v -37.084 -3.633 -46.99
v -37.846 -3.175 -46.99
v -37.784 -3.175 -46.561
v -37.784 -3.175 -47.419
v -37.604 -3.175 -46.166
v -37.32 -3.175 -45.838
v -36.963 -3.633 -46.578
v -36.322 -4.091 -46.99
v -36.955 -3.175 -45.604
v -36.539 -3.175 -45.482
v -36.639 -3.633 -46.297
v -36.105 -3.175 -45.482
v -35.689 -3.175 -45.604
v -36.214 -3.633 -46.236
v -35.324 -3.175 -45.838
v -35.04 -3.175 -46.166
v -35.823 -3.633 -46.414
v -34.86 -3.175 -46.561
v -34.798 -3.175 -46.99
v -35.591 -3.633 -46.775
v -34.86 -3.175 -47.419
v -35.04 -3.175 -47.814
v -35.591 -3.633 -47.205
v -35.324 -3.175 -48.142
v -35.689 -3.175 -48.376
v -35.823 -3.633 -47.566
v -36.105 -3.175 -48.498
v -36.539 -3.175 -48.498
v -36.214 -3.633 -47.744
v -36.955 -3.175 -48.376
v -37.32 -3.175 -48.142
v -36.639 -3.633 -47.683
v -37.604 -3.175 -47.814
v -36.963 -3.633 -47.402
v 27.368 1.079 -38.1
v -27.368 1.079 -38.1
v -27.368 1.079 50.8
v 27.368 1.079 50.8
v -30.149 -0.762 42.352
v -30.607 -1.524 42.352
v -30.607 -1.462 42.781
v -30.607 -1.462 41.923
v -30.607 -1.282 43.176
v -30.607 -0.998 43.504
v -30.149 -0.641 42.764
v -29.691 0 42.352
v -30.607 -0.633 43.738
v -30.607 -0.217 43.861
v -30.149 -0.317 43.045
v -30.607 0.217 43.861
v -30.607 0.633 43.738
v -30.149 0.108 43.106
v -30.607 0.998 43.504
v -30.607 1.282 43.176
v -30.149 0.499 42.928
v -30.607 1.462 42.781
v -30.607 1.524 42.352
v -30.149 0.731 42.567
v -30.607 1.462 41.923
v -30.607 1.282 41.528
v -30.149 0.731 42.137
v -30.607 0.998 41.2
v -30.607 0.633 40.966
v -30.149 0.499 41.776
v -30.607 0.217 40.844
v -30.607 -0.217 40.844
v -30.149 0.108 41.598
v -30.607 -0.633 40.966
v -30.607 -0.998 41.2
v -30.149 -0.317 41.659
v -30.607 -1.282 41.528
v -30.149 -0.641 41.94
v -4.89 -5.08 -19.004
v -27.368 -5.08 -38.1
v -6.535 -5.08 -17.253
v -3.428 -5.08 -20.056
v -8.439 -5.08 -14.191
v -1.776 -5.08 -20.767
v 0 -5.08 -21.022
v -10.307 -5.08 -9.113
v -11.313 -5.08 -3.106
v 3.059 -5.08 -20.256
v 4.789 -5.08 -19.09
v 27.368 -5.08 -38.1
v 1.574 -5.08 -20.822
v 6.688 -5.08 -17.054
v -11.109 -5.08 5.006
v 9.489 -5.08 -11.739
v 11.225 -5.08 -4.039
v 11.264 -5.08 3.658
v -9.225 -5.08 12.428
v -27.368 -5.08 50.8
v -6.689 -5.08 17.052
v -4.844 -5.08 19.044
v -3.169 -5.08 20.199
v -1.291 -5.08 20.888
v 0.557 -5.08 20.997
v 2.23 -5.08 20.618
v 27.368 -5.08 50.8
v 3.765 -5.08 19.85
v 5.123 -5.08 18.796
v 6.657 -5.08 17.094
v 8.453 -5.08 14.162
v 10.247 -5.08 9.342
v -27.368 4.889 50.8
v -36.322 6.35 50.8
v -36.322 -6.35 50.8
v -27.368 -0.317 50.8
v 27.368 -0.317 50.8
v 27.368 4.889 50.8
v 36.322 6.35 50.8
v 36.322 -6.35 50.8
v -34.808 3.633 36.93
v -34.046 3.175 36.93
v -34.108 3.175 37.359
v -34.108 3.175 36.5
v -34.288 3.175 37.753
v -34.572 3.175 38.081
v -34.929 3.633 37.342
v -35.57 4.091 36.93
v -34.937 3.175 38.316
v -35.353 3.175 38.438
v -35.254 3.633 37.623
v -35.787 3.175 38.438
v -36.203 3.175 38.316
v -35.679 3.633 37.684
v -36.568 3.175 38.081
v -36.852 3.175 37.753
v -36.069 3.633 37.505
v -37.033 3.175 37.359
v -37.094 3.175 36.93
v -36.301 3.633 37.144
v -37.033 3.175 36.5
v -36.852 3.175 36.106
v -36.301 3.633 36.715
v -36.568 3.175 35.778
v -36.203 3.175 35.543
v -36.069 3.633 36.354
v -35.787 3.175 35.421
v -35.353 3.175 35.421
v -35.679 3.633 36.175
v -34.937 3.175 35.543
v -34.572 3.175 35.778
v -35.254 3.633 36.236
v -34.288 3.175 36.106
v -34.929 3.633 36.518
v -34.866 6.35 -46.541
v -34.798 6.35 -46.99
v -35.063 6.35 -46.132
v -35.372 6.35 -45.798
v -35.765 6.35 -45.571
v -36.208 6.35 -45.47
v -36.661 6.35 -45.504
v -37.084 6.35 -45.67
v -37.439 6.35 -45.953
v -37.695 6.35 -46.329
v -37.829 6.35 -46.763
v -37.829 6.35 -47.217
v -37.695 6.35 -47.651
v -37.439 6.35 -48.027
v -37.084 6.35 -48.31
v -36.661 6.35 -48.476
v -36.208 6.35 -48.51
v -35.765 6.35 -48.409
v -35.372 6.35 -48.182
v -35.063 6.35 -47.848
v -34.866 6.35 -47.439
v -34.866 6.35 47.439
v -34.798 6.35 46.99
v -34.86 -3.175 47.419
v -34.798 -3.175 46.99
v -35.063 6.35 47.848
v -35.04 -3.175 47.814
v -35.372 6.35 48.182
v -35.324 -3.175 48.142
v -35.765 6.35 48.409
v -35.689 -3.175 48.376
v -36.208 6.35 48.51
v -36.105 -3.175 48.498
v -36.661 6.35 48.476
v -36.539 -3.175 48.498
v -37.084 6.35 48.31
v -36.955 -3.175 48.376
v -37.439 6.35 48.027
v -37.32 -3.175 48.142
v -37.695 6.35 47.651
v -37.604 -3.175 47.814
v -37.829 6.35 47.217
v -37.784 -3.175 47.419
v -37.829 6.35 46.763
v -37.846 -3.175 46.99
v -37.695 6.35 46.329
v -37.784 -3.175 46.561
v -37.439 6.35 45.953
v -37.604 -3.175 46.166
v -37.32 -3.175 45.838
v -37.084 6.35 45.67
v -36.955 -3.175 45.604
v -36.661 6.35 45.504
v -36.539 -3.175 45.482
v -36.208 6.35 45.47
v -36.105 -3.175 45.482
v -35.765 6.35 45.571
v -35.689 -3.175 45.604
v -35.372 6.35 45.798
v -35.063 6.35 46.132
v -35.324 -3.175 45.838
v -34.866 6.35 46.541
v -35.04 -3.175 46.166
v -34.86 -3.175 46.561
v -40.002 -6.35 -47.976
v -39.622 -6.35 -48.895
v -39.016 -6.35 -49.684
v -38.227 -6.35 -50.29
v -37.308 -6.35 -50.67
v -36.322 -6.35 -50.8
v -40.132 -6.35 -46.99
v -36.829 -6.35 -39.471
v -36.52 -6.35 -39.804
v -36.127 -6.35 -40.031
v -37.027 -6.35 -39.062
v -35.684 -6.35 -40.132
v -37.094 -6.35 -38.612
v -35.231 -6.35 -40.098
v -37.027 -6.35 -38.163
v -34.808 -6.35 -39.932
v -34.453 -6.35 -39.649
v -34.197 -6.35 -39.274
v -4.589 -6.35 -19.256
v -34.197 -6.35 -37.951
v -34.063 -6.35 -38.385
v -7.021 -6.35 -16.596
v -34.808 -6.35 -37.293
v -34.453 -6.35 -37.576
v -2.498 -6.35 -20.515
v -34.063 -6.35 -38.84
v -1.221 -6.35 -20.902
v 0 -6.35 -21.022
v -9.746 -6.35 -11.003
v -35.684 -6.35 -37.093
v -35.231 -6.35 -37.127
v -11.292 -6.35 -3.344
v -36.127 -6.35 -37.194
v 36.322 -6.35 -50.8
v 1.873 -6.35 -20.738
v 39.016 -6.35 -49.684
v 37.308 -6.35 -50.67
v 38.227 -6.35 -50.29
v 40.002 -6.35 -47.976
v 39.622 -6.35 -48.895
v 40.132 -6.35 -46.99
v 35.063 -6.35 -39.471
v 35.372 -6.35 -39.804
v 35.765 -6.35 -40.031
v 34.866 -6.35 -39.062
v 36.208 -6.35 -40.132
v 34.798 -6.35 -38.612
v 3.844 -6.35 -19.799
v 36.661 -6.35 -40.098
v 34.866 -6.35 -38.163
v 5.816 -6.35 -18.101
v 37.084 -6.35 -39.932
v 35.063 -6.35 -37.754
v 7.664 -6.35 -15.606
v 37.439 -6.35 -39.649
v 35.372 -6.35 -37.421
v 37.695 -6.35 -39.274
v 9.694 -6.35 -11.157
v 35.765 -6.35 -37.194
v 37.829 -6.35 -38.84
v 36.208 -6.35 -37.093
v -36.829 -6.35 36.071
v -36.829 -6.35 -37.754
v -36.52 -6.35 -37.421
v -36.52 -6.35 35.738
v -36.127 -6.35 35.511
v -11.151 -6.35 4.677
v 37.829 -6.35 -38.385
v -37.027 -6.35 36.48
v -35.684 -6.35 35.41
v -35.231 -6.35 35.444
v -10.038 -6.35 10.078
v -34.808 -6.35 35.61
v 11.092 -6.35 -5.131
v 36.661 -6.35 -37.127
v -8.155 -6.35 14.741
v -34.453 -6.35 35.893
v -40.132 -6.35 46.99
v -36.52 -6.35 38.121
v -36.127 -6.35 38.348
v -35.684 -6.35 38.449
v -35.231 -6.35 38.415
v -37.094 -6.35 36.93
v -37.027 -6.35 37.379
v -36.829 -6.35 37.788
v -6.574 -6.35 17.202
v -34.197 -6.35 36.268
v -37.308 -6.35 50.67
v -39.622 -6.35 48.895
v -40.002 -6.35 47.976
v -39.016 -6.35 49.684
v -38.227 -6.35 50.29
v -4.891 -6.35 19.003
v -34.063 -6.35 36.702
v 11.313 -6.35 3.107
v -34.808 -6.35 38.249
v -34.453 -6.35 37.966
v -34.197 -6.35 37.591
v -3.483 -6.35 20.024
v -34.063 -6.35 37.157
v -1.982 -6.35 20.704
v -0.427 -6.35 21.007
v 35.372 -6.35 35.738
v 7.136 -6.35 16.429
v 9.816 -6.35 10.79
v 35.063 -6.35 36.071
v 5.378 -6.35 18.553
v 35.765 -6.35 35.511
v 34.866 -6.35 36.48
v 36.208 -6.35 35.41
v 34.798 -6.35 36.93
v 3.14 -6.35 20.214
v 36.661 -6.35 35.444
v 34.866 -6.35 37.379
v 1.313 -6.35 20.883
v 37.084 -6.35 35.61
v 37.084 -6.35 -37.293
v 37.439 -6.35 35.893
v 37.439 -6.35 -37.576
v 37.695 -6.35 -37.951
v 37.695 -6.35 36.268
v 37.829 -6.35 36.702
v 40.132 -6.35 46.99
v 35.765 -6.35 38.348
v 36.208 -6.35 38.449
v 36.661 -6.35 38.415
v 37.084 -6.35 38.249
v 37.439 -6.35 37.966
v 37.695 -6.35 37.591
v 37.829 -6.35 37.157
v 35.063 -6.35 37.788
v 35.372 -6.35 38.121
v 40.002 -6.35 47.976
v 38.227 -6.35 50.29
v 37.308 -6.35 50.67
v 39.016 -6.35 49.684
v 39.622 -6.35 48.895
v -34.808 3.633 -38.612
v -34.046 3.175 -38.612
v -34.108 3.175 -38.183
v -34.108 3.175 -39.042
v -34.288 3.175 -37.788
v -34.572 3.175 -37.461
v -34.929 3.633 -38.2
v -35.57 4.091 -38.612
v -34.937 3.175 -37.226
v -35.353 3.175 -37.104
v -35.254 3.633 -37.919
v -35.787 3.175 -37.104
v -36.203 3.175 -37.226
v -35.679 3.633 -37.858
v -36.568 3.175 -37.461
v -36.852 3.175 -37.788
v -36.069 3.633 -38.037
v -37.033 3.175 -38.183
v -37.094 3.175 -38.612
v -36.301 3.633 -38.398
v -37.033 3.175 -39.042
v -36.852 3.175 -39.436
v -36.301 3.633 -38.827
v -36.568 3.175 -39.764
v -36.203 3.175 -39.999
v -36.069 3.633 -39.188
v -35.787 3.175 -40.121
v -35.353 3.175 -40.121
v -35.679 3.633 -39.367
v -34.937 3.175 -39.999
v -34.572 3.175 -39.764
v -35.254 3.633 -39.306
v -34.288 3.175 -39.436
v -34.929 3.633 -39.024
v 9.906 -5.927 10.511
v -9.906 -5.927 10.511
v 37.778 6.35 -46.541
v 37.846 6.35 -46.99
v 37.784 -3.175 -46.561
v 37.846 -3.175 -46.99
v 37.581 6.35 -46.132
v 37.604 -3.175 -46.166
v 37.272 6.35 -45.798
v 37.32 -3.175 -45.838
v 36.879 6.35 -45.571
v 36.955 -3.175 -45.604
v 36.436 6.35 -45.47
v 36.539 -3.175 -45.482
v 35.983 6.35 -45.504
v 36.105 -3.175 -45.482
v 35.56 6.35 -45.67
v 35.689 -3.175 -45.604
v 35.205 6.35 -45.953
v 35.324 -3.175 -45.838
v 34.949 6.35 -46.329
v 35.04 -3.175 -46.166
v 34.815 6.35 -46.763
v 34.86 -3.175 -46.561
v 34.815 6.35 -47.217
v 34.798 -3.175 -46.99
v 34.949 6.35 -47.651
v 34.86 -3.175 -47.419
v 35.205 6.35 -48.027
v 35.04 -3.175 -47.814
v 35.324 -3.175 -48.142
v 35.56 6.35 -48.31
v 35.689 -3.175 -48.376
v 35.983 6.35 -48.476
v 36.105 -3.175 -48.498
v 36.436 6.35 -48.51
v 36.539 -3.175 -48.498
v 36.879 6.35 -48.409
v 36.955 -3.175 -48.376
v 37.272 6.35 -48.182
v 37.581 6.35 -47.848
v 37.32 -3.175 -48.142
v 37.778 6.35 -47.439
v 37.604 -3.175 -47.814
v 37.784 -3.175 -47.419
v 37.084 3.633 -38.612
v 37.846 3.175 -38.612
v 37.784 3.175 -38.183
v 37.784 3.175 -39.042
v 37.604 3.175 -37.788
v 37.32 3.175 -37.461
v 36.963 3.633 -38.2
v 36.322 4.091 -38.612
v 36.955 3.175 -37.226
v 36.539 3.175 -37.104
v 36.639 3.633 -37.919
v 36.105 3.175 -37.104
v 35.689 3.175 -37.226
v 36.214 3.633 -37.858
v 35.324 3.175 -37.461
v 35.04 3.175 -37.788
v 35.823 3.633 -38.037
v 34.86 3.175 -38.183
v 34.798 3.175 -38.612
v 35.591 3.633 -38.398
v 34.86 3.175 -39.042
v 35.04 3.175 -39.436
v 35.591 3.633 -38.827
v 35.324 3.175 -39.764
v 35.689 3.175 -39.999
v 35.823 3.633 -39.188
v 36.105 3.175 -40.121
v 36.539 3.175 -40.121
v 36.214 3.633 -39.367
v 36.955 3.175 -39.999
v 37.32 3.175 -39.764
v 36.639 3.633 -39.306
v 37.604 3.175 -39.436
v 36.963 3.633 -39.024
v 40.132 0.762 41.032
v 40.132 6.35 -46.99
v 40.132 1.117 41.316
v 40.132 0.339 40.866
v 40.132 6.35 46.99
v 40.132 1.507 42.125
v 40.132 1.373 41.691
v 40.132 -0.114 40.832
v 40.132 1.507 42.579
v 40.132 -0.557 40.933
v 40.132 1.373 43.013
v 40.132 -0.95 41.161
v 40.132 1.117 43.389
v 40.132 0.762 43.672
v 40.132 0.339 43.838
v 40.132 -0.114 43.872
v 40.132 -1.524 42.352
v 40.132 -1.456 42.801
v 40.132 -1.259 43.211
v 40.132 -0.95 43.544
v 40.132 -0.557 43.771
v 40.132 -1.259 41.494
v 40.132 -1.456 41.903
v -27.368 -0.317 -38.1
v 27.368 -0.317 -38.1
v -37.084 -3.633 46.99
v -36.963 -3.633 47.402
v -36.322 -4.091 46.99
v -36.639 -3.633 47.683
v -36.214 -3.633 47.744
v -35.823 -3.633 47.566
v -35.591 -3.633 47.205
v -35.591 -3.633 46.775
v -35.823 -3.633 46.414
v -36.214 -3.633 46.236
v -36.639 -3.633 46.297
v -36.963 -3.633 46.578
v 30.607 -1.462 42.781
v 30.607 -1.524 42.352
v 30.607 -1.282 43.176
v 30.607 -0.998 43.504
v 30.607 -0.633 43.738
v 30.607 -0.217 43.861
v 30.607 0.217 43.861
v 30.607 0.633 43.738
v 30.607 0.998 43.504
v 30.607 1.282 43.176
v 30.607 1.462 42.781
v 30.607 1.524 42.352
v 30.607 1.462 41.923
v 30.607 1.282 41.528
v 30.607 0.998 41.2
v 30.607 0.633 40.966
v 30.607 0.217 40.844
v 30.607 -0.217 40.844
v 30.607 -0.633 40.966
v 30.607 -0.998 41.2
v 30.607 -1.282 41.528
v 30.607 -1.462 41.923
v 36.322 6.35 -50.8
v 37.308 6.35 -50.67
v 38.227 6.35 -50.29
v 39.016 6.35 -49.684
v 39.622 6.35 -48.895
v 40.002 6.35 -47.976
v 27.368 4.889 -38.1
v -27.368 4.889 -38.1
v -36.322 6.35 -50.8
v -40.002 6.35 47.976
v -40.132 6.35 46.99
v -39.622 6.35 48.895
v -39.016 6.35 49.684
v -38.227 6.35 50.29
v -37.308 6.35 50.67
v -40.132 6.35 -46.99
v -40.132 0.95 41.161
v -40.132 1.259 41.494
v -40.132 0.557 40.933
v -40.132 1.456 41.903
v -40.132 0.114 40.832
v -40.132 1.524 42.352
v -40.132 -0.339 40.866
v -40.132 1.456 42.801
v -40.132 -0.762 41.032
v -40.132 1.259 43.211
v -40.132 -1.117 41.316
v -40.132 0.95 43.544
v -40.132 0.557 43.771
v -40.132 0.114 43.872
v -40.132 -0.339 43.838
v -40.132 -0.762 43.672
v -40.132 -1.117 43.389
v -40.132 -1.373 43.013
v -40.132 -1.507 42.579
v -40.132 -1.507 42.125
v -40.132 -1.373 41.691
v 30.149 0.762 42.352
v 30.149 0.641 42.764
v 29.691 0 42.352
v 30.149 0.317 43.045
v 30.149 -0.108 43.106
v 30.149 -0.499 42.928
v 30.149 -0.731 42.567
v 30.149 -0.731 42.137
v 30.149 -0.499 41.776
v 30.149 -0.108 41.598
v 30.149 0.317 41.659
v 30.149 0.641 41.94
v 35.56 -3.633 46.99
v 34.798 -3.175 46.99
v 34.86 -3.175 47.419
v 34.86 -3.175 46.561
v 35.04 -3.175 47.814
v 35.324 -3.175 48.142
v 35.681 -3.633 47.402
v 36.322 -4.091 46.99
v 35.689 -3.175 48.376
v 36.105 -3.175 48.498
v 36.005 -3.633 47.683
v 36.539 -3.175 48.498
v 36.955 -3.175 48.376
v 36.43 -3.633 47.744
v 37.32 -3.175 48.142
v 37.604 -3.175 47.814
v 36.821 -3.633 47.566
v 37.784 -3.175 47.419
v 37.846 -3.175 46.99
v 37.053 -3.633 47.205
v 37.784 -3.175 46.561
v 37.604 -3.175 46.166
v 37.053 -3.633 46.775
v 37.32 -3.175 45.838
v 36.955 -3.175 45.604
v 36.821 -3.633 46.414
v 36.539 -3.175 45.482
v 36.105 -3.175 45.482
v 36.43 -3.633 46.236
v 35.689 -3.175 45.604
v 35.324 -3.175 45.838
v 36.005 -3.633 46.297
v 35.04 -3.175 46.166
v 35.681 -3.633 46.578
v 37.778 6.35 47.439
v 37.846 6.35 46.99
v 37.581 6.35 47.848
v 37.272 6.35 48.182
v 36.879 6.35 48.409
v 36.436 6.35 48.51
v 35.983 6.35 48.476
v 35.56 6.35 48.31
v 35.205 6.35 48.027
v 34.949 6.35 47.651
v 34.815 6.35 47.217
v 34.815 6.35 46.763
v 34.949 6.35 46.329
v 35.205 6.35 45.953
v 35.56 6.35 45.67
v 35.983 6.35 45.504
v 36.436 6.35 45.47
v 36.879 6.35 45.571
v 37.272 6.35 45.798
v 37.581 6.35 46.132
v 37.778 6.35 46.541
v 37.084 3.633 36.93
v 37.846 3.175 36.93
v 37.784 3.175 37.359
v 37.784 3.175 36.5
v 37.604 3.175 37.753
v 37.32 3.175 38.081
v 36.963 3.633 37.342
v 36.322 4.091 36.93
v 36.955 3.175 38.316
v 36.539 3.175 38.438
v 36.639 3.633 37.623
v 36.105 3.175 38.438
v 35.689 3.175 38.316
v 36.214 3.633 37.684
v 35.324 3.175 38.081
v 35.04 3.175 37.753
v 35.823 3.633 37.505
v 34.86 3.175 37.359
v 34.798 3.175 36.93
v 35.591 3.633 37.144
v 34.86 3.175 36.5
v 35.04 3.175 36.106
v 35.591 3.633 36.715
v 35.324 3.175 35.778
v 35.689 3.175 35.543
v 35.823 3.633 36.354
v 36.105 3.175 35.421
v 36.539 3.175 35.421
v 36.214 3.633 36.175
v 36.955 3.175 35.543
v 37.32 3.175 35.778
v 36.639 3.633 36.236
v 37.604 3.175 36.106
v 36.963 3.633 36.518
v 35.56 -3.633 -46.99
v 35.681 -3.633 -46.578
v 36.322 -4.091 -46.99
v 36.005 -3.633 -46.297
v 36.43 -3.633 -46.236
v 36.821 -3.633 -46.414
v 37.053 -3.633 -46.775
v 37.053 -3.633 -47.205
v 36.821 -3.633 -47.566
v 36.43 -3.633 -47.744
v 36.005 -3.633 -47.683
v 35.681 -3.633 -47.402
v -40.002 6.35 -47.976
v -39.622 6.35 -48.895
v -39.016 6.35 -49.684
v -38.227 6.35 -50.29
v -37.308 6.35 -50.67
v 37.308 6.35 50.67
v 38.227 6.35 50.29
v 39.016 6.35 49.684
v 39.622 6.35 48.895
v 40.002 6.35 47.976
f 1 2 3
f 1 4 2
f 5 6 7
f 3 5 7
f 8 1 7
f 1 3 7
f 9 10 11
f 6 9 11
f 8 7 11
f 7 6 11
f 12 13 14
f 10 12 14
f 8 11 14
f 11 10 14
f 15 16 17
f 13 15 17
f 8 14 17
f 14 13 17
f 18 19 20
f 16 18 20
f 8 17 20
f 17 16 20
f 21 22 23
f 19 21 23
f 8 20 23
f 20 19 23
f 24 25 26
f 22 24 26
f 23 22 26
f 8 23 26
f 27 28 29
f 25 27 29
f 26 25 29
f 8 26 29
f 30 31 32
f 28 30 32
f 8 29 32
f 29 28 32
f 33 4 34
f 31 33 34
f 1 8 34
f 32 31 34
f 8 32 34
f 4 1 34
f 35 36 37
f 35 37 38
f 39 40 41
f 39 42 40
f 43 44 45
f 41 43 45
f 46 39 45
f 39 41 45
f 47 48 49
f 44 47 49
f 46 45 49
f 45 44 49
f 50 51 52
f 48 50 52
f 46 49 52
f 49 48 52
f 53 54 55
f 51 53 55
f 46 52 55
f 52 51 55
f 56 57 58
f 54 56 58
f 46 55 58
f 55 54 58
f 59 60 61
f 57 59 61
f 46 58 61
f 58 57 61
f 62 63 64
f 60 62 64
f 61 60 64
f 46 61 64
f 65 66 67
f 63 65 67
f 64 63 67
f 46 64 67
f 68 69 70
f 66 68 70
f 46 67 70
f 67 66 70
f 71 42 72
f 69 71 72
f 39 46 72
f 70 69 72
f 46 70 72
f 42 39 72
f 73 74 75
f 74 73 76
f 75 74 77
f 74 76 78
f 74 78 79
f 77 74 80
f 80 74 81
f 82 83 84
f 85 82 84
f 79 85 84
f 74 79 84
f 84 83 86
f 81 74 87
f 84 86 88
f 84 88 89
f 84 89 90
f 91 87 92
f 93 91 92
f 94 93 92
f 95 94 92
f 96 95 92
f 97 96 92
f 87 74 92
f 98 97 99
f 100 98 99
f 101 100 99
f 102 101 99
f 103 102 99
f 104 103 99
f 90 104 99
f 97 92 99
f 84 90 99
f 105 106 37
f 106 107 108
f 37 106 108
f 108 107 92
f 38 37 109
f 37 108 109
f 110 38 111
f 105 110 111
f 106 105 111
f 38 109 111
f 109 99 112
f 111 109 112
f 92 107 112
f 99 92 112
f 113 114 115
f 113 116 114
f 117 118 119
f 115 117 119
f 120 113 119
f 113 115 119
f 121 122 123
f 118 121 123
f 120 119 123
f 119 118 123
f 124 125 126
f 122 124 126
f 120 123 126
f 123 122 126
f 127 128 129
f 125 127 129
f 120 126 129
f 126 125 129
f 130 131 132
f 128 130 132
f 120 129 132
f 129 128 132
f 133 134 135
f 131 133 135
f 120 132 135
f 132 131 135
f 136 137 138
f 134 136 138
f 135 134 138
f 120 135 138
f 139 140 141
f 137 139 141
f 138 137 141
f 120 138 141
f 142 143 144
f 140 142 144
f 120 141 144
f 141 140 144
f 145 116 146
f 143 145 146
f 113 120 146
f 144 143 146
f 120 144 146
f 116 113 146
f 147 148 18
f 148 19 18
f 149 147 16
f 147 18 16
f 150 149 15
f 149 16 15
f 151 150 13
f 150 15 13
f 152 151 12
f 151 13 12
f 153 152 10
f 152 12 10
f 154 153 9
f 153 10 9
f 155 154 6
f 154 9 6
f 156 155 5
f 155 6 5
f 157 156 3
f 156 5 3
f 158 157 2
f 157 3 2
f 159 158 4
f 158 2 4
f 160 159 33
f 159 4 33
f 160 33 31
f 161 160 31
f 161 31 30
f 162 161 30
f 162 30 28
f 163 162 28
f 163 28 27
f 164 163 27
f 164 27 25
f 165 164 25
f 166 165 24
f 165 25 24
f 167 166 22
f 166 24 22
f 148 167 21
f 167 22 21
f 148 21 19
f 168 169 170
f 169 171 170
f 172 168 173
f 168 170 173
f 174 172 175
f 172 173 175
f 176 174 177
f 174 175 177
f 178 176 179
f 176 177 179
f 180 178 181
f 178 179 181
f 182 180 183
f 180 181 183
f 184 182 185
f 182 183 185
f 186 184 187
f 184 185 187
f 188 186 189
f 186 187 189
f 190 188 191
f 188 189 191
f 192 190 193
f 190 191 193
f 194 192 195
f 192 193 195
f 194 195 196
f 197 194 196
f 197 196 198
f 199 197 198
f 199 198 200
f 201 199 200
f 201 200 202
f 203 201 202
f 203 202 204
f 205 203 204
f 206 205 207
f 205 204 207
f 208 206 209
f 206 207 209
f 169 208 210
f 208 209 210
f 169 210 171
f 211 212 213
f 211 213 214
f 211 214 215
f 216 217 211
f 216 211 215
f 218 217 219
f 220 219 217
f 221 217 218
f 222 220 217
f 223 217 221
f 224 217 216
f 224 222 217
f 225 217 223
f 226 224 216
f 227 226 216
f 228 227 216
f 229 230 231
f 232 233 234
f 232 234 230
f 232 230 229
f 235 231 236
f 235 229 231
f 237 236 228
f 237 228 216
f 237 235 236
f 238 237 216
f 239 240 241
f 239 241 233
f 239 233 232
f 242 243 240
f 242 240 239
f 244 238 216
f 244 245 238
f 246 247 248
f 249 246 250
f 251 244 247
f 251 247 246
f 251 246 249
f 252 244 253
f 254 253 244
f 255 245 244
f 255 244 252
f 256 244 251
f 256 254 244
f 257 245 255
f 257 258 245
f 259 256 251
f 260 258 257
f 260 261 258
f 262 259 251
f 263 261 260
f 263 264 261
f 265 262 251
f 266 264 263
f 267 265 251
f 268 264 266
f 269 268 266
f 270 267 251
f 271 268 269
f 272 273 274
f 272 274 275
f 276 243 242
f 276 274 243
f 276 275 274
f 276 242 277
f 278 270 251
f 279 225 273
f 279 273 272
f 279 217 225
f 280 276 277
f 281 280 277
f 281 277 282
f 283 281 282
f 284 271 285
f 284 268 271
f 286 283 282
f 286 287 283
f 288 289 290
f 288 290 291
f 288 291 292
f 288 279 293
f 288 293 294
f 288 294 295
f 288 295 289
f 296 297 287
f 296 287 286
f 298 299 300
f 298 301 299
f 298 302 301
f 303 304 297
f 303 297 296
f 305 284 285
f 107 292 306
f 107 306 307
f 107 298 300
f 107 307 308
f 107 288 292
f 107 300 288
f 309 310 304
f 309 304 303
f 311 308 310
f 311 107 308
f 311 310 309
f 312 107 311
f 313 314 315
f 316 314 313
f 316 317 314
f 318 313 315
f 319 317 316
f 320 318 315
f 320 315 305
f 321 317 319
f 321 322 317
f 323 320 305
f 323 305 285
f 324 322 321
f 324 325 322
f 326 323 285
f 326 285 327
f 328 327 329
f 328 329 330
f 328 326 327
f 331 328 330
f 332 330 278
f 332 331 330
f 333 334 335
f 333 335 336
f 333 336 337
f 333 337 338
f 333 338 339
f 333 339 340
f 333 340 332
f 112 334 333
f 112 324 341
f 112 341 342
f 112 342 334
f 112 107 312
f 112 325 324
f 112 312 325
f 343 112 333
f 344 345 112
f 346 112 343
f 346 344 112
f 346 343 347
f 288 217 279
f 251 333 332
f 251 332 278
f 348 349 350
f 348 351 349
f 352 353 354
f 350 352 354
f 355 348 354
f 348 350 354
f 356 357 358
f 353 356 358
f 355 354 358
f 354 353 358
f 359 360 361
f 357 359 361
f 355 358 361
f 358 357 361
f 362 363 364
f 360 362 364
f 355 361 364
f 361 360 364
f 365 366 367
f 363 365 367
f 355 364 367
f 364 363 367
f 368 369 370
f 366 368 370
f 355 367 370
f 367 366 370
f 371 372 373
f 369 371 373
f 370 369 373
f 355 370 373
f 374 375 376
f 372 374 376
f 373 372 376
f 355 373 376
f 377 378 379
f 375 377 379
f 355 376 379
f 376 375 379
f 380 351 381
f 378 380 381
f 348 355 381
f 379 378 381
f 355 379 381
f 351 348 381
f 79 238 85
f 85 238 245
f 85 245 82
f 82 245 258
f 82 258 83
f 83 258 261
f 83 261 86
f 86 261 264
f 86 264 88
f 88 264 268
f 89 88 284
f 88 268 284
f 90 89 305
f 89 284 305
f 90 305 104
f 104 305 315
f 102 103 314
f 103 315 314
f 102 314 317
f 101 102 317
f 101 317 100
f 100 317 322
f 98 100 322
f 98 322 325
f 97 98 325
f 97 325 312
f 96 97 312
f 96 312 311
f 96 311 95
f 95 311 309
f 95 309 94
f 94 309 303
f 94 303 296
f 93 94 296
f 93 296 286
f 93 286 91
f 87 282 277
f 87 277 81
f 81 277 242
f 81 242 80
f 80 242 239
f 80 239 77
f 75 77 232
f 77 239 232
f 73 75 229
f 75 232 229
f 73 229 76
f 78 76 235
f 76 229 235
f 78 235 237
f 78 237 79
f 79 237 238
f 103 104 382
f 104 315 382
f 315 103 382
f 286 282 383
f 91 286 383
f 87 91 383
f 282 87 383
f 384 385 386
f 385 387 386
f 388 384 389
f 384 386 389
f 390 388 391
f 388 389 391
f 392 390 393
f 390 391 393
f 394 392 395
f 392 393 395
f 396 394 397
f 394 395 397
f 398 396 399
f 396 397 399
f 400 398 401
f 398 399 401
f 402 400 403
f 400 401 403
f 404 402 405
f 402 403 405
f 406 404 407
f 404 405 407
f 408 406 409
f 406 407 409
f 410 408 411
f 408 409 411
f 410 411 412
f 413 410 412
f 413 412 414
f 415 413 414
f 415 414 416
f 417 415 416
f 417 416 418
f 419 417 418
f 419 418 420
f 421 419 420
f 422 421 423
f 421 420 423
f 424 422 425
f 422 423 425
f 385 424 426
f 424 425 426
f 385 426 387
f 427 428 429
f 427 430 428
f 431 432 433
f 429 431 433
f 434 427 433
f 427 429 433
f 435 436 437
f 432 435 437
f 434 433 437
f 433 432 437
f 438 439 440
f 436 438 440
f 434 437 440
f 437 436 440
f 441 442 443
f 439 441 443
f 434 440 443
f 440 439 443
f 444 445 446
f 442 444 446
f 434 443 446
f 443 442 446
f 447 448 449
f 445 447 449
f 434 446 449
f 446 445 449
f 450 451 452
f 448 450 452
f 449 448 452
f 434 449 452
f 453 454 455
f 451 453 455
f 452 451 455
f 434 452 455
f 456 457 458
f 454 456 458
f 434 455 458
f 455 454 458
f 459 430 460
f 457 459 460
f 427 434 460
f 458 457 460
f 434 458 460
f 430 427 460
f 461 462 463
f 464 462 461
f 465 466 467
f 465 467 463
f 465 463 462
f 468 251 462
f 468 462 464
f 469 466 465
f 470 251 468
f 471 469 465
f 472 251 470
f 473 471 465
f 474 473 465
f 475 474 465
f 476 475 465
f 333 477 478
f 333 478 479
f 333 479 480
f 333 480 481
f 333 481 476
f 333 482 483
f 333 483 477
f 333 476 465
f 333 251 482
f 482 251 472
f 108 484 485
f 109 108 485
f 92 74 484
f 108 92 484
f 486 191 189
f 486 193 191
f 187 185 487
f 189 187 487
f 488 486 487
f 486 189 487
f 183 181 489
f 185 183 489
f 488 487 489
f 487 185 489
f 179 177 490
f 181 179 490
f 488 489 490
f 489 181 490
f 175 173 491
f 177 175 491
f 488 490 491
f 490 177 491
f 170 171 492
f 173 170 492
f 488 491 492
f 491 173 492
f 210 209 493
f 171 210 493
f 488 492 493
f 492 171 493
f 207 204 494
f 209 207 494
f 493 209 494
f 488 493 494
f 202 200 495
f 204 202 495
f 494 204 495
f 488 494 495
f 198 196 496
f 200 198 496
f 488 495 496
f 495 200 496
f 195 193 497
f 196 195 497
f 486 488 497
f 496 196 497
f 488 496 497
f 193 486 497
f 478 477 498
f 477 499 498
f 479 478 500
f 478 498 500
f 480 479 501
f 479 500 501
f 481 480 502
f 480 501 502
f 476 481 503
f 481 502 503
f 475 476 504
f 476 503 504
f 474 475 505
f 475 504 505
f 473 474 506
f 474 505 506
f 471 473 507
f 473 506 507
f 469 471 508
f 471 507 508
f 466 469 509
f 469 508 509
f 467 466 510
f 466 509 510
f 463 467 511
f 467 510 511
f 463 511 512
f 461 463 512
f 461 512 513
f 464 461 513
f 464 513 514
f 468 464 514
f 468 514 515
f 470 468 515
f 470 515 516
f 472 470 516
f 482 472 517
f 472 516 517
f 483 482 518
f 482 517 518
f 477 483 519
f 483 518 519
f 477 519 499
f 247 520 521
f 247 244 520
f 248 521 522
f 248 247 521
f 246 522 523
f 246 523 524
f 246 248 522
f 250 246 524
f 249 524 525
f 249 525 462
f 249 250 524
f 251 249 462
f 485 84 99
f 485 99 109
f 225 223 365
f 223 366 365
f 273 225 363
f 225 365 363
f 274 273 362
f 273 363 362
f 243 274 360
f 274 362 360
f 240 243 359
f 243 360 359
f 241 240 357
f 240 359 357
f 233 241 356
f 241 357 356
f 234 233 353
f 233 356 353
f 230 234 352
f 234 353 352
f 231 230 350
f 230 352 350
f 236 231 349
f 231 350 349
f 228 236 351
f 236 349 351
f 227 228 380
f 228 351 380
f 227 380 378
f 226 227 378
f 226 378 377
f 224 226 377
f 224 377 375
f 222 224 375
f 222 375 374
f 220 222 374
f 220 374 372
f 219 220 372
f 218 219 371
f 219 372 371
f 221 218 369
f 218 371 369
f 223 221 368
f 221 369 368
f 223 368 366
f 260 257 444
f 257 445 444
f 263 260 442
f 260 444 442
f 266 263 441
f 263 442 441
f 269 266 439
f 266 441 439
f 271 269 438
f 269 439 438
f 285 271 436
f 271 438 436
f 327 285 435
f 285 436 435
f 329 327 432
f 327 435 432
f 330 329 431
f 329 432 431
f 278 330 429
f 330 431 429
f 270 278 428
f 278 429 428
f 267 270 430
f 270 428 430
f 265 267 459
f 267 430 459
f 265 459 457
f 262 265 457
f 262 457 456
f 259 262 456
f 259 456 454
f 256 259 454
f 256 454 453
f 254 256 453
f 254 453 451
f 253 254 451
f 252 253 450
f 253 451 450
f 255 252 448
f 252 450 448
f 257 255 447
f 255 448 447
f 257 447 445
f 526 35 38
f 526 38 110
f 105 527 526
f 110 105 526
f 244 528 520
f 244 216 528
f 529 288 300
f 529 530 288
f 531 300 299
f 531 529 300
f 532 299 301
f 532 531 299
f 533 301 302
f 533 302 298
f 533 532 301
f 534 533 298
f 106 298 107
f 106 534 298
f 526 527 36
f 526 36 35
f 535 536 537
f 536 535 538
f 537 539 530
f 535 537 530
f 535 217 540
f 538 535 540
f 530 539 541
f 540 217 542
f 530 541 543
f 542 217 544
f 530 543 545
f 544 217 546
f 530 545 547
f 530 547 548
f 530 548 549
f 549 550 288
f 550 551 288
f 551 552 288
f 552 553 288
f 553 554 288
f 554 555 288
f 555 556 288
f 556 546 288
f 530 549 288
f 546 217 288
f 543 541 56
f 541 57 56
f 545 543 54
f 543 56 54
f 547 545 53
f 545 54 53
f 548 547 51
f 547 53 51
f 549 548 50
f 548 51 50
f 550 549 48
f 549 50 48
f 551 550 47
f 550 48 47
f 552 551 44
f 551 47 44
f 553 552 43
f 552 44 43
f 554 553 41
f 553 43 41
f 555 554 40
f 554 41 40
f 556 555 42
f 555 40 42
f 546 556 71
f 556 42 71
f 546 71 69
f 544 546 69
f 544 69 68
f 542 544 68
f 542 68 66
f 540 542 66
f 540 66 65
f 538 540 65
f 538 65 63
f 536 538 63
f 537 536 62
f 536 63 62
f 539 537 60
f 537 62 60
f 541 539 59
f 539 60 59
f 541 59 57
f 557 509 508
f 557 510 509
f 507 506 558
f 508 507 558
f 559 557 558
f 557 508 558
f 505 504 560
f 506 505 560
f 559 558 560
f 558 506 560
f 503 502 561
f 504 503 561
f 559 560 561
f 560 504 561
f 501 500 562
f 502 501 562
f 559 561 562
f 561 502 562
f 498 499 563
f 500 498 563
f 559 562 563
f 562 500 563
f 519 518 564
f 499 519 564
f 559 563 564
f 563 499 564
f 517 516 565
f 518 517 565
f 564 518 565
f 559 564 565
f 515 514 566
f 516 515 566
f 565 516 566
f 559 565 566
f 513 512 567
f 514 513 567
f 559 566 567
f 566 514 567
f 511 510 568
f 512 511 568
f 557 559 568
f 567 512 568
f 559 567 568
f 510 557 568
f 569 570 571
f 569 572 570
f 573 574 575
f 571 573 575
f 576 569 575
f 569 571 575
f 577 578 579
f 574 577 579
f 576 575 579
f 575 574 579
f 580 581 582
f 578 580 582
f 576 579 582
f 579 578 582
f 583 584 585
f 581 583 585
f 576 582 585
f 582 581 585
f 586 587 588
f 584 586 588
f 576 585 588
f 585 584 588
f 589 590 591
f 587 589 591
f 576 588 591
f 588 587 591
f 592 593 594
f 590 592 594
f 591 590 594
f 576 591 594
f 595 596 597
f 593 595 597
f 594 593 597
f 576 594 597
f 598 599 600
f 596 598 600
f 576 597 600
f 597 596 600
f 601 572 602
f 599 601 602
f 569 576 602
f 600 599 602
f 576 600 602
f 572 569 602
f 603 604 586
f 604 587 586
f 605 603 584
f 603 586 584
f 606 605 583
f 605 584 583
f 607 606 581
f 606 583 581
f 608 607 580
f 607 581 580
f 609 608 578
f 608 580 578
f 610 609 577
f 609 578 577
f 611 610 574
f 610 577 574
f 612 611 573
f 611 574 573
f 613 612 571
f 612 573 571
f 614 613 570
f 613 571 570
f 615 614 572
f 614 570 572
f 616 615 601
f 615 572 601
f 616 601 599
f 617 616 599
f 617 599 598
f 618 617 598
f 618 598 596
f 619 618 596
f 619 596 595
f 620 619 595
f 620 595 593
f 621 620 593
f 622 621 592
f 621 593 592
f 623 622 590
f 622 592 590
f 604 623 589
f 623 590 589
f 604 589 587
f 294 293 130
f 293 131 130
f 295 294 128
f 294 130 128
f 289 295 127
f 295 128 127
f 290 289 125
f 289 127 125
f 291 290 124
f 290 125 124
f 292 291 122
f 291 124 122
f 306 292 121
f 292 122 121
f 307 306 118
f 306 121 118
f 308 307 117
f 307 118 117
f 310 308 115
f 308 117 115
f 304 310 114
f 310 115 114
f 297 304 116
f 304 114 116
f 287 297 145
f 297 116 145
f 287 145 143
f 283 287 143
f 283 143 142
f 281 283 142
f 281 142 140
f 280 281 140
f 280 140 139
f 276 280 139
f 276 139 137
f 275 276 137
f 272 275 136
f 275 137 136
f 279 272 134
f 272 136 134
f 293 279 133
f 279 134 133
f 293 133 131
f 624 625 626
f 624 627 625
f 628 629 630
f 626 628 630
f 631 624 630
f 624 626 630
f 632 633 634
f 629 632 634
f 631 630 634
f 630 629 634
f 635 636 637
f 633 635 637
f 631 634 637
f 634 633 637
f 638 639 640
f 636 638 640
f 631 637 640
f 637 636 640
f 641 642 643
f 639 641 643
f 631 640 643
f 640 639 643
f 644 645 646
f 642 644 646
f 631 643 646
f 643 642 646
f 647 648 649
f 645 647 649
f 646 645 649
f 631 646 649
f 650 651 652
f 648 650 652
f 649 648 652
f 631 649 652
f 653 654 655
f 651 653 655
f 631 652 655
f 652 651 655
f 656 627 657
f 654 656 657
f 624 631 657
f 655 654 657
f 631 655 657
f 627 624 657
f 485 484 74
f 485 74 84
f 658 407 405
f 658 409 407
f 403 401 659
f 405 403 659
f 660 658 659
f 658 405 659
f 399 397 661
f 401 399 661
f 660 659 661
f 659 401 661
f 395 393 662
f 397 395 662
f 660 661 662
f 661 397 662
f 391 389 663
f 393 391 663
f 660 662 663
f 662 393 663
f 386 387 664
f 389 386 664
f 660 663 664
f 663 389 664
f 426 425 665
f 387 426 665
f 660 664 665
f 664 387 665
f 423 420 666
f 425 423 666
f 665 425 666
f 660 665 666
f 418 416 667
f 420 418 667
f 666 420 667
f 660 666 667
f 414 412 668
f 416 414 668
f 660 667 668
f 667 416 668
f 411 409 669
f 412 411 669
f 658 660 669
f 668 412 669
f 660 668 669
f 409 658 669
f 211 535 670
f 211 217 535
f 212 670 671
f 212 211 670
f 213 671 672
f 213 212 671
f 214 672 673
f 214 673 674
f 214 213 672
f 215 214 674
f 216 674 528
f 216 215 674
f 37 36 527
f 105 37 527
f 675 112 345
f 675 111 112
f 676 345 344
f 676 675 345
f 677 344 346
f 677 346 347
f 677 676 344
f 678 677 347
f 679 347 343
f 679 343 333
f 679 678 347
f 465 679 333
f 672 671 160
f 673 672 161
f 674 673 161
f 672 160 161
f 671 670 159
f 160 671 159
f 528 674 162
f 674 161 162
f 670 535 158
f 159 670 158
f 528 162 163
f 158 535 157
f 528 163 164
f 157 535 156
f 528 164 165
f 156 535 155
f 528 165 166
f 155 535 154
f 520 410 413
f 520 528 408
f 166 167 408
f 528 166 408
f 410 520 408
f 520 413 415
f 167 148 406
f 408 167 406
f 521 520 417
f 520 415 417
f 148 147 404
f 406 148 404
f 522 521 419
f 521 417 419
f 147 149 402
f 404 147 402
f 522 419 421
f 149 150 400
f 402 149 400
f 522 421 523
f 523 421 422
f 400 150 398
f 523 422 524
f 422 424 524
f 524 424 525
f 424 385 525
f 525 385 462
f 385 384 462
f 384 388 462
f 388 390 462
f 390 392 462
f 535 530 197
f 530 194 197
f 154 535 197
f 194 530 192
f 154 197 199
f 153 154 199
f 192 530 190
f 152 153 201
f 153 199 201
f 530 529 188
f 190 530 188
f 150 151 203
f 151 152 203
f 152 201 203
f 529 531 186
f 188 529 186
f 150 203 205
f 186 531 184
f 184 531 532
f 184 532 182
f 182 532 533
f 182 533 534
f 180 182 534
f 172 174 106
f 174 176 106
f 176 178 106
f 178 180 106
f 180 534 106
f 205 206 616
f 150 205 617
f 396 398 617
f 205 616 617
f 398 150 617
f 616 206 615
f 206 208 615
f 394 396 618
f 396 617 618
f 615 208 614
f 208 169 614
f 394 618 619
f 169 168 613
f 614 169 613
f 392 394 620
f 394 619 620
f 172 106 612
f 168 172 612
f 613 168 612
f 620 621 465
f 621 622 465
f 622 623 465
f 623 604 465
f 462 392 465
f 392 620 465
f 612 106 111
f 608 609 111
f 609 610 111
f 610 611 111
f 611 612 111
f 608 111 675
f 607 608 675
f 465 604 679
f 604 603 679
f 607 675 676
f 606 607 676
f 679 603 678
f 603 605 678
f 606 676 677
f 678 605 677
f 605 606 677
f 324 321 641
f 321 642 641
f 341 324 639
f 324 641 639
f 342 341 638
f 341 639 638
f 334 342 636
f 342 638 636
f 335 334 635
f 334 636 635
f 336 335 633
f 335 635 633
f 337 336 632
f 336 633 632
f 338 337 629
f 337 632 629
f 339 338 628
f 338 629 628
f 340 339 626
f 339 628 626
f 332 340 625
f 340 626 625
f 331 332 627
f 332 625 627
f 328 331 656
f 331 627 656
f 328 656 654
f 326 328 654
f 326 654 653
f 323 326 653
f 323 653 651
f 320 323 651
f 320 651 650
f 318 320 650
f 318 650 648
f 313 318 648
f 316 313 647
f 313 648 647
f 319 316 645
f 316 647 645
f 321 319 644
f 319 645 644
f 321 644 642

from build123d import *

# Parameters (mm, degrees)
F0_W      = 80.264
F0_H      = 101.6
F1_DEPTH  = 6.35
F2_W      = 54.737
F2_H      = 4.7625
F3_DEPTH  = 88.9
F5_DEPTH  = 5.08
F6_W      = 54.737
F6_H      = 3.81
F7_DEPTH  = 88.9
F8_R      = 3.81
F10_D     = 3.048
F10_DEPTH = 9.525
F10_TIP   = 0.9157115834
F12_D     = 3.048
F12_DEPTH = 9.525
F12_TIP   = 0.9157115834
F14_D     = 3.048
F14_DEPTH = 9.525
F14_TIP   = 0.9157115834
F16_D     = 3.048
F16_DEPTH = 9.525
F16_TIP   = 0.9157115834


with BuildPart() as f1:
    # F0 (on Front) → F1 (new body, symmetric)
    with BuildSketch(Plane.XZ):
        Rectangle(F0_W, F0_H)
    extrude(amount=F1_DEPTH, both=True)

    # F2 (on face) → F3 (cut)
    with BuildSketch(Plane.XY.offset(50.8)):
        with Locations((0, -2.69875)):
            Rectangle(F2_W, F2_H)
    extrude(amount=-F3_DEPTH, mode=Mode.SUBTRACT)

    # F4 (on face) → F5 (cut)
    with BuildSketch(Plane.XZ.offset(6.35)):
        with BuildLine():
            add(Edge.make_bspline(
                [(0, -21.021893248), (19.8113411297, -21.021893248), (9.9056705649, 10.510946624), (0, 42.0437864959), (-9.9056705649, 10.510946624), (-19.8113411297, -21.021893248), (0, -21.021893248)],
                knots=[0, 0, 0, 2.0943951024, 2.0943951024, 4.1887902048, 4.1887902048, 6.2831853072, 6.2831853072, 6.2831853072], degree=2, weights=[1, 0.5, 1, 0.5, 1, 0.5, 1]))
        make_face()
    extrude(amount=-F5_DEPTH, mode=Mode.SUBTRACT)

    # F6 (on face) → F7 (cut)
    with BuildSketch(Plane.XY.offset(50.8)):
        with Locations((0, 2.9844999377)):
            Rectangle(F6_W, F6_H)
    extrude(amount=-F7_DEPTH, mode=Mode.SUBTRACT)

    # F8
    f8_edges = [f1.edges().sort_by_distance(p)[0] for p in [
        (40.132, 0, 50.8),
        (-40.132, 0, 50.8),
        (-40.132, 0, -50.8),
        (40.132, 0, -50.8),
    ]]
    fillet(f8_edges, radius=F8_R)

    # F10
    with Locations(Plane(origin=(-40.132, 0, 0), x_dir=(0, -1, 0), z_dir=(-1, 0, 0))):
        with Locations((0, 42.3520989716)):
            Hole(F10_D / 2, depth=F10_DEPTH)
            with Locations((0, 0, -(F10_DEPTH + F10_TIP / 2))):  # 118° drill point
                Cone(0, F10_D / 2, F10_TIP, mode=Mode.SUBTRACT)

    # F12
    with Locations(Plane.YZ.offset(40.132)):
        with Locations((0, 42.3520989716)):
            Hole(F12_D / 2, depth=F12_DEPTH)
            with Locations((0, 0, -(F12_DEPTH + F12_TIP / 2))):  # 118° drill point
                Cone(0, F12_D / 2, F12_TIP, mode=Mode.SUBTRACT)

    # F14
    with Locations(Plane(origin=(0, 6.35, 0), x_dir=(-1, 0, 0), z_dir=(0, 1, 0))):
        with Locations((-36.322, 46.99), (36.322, 46.99), (-36.322, -46.99), (36.322, -46.99)):
            Hole(F14_D / 2, depth=F14_DEPTH)
            with Locations((0, 0, -(F14_DEPTH + F14_TIP / 2))):  # 118° drill point
                Cone(0, F14_D / 2, F14_TIP, mode=Mode.SUBTRACT)

    # F16
    with Locations(Plane.XZ.offset(6.35)):
        with Locations((-35.5702526867, 36.9295366108), (-35.5702526867, -38.6124029756), (36.322, -38.6124029756), (36.322, 36.9295366108)):
            Hole(F16_D / 2, depth=F16_DEPTH)
            with Locations((0, 0, -(F16_DEPTH + F16_TIP / 2))):  # 118° drill point
                Cone(0, F16_D / 2, F16_TIP, mode=Mode.SUBTRACT)


solid = f1.part
